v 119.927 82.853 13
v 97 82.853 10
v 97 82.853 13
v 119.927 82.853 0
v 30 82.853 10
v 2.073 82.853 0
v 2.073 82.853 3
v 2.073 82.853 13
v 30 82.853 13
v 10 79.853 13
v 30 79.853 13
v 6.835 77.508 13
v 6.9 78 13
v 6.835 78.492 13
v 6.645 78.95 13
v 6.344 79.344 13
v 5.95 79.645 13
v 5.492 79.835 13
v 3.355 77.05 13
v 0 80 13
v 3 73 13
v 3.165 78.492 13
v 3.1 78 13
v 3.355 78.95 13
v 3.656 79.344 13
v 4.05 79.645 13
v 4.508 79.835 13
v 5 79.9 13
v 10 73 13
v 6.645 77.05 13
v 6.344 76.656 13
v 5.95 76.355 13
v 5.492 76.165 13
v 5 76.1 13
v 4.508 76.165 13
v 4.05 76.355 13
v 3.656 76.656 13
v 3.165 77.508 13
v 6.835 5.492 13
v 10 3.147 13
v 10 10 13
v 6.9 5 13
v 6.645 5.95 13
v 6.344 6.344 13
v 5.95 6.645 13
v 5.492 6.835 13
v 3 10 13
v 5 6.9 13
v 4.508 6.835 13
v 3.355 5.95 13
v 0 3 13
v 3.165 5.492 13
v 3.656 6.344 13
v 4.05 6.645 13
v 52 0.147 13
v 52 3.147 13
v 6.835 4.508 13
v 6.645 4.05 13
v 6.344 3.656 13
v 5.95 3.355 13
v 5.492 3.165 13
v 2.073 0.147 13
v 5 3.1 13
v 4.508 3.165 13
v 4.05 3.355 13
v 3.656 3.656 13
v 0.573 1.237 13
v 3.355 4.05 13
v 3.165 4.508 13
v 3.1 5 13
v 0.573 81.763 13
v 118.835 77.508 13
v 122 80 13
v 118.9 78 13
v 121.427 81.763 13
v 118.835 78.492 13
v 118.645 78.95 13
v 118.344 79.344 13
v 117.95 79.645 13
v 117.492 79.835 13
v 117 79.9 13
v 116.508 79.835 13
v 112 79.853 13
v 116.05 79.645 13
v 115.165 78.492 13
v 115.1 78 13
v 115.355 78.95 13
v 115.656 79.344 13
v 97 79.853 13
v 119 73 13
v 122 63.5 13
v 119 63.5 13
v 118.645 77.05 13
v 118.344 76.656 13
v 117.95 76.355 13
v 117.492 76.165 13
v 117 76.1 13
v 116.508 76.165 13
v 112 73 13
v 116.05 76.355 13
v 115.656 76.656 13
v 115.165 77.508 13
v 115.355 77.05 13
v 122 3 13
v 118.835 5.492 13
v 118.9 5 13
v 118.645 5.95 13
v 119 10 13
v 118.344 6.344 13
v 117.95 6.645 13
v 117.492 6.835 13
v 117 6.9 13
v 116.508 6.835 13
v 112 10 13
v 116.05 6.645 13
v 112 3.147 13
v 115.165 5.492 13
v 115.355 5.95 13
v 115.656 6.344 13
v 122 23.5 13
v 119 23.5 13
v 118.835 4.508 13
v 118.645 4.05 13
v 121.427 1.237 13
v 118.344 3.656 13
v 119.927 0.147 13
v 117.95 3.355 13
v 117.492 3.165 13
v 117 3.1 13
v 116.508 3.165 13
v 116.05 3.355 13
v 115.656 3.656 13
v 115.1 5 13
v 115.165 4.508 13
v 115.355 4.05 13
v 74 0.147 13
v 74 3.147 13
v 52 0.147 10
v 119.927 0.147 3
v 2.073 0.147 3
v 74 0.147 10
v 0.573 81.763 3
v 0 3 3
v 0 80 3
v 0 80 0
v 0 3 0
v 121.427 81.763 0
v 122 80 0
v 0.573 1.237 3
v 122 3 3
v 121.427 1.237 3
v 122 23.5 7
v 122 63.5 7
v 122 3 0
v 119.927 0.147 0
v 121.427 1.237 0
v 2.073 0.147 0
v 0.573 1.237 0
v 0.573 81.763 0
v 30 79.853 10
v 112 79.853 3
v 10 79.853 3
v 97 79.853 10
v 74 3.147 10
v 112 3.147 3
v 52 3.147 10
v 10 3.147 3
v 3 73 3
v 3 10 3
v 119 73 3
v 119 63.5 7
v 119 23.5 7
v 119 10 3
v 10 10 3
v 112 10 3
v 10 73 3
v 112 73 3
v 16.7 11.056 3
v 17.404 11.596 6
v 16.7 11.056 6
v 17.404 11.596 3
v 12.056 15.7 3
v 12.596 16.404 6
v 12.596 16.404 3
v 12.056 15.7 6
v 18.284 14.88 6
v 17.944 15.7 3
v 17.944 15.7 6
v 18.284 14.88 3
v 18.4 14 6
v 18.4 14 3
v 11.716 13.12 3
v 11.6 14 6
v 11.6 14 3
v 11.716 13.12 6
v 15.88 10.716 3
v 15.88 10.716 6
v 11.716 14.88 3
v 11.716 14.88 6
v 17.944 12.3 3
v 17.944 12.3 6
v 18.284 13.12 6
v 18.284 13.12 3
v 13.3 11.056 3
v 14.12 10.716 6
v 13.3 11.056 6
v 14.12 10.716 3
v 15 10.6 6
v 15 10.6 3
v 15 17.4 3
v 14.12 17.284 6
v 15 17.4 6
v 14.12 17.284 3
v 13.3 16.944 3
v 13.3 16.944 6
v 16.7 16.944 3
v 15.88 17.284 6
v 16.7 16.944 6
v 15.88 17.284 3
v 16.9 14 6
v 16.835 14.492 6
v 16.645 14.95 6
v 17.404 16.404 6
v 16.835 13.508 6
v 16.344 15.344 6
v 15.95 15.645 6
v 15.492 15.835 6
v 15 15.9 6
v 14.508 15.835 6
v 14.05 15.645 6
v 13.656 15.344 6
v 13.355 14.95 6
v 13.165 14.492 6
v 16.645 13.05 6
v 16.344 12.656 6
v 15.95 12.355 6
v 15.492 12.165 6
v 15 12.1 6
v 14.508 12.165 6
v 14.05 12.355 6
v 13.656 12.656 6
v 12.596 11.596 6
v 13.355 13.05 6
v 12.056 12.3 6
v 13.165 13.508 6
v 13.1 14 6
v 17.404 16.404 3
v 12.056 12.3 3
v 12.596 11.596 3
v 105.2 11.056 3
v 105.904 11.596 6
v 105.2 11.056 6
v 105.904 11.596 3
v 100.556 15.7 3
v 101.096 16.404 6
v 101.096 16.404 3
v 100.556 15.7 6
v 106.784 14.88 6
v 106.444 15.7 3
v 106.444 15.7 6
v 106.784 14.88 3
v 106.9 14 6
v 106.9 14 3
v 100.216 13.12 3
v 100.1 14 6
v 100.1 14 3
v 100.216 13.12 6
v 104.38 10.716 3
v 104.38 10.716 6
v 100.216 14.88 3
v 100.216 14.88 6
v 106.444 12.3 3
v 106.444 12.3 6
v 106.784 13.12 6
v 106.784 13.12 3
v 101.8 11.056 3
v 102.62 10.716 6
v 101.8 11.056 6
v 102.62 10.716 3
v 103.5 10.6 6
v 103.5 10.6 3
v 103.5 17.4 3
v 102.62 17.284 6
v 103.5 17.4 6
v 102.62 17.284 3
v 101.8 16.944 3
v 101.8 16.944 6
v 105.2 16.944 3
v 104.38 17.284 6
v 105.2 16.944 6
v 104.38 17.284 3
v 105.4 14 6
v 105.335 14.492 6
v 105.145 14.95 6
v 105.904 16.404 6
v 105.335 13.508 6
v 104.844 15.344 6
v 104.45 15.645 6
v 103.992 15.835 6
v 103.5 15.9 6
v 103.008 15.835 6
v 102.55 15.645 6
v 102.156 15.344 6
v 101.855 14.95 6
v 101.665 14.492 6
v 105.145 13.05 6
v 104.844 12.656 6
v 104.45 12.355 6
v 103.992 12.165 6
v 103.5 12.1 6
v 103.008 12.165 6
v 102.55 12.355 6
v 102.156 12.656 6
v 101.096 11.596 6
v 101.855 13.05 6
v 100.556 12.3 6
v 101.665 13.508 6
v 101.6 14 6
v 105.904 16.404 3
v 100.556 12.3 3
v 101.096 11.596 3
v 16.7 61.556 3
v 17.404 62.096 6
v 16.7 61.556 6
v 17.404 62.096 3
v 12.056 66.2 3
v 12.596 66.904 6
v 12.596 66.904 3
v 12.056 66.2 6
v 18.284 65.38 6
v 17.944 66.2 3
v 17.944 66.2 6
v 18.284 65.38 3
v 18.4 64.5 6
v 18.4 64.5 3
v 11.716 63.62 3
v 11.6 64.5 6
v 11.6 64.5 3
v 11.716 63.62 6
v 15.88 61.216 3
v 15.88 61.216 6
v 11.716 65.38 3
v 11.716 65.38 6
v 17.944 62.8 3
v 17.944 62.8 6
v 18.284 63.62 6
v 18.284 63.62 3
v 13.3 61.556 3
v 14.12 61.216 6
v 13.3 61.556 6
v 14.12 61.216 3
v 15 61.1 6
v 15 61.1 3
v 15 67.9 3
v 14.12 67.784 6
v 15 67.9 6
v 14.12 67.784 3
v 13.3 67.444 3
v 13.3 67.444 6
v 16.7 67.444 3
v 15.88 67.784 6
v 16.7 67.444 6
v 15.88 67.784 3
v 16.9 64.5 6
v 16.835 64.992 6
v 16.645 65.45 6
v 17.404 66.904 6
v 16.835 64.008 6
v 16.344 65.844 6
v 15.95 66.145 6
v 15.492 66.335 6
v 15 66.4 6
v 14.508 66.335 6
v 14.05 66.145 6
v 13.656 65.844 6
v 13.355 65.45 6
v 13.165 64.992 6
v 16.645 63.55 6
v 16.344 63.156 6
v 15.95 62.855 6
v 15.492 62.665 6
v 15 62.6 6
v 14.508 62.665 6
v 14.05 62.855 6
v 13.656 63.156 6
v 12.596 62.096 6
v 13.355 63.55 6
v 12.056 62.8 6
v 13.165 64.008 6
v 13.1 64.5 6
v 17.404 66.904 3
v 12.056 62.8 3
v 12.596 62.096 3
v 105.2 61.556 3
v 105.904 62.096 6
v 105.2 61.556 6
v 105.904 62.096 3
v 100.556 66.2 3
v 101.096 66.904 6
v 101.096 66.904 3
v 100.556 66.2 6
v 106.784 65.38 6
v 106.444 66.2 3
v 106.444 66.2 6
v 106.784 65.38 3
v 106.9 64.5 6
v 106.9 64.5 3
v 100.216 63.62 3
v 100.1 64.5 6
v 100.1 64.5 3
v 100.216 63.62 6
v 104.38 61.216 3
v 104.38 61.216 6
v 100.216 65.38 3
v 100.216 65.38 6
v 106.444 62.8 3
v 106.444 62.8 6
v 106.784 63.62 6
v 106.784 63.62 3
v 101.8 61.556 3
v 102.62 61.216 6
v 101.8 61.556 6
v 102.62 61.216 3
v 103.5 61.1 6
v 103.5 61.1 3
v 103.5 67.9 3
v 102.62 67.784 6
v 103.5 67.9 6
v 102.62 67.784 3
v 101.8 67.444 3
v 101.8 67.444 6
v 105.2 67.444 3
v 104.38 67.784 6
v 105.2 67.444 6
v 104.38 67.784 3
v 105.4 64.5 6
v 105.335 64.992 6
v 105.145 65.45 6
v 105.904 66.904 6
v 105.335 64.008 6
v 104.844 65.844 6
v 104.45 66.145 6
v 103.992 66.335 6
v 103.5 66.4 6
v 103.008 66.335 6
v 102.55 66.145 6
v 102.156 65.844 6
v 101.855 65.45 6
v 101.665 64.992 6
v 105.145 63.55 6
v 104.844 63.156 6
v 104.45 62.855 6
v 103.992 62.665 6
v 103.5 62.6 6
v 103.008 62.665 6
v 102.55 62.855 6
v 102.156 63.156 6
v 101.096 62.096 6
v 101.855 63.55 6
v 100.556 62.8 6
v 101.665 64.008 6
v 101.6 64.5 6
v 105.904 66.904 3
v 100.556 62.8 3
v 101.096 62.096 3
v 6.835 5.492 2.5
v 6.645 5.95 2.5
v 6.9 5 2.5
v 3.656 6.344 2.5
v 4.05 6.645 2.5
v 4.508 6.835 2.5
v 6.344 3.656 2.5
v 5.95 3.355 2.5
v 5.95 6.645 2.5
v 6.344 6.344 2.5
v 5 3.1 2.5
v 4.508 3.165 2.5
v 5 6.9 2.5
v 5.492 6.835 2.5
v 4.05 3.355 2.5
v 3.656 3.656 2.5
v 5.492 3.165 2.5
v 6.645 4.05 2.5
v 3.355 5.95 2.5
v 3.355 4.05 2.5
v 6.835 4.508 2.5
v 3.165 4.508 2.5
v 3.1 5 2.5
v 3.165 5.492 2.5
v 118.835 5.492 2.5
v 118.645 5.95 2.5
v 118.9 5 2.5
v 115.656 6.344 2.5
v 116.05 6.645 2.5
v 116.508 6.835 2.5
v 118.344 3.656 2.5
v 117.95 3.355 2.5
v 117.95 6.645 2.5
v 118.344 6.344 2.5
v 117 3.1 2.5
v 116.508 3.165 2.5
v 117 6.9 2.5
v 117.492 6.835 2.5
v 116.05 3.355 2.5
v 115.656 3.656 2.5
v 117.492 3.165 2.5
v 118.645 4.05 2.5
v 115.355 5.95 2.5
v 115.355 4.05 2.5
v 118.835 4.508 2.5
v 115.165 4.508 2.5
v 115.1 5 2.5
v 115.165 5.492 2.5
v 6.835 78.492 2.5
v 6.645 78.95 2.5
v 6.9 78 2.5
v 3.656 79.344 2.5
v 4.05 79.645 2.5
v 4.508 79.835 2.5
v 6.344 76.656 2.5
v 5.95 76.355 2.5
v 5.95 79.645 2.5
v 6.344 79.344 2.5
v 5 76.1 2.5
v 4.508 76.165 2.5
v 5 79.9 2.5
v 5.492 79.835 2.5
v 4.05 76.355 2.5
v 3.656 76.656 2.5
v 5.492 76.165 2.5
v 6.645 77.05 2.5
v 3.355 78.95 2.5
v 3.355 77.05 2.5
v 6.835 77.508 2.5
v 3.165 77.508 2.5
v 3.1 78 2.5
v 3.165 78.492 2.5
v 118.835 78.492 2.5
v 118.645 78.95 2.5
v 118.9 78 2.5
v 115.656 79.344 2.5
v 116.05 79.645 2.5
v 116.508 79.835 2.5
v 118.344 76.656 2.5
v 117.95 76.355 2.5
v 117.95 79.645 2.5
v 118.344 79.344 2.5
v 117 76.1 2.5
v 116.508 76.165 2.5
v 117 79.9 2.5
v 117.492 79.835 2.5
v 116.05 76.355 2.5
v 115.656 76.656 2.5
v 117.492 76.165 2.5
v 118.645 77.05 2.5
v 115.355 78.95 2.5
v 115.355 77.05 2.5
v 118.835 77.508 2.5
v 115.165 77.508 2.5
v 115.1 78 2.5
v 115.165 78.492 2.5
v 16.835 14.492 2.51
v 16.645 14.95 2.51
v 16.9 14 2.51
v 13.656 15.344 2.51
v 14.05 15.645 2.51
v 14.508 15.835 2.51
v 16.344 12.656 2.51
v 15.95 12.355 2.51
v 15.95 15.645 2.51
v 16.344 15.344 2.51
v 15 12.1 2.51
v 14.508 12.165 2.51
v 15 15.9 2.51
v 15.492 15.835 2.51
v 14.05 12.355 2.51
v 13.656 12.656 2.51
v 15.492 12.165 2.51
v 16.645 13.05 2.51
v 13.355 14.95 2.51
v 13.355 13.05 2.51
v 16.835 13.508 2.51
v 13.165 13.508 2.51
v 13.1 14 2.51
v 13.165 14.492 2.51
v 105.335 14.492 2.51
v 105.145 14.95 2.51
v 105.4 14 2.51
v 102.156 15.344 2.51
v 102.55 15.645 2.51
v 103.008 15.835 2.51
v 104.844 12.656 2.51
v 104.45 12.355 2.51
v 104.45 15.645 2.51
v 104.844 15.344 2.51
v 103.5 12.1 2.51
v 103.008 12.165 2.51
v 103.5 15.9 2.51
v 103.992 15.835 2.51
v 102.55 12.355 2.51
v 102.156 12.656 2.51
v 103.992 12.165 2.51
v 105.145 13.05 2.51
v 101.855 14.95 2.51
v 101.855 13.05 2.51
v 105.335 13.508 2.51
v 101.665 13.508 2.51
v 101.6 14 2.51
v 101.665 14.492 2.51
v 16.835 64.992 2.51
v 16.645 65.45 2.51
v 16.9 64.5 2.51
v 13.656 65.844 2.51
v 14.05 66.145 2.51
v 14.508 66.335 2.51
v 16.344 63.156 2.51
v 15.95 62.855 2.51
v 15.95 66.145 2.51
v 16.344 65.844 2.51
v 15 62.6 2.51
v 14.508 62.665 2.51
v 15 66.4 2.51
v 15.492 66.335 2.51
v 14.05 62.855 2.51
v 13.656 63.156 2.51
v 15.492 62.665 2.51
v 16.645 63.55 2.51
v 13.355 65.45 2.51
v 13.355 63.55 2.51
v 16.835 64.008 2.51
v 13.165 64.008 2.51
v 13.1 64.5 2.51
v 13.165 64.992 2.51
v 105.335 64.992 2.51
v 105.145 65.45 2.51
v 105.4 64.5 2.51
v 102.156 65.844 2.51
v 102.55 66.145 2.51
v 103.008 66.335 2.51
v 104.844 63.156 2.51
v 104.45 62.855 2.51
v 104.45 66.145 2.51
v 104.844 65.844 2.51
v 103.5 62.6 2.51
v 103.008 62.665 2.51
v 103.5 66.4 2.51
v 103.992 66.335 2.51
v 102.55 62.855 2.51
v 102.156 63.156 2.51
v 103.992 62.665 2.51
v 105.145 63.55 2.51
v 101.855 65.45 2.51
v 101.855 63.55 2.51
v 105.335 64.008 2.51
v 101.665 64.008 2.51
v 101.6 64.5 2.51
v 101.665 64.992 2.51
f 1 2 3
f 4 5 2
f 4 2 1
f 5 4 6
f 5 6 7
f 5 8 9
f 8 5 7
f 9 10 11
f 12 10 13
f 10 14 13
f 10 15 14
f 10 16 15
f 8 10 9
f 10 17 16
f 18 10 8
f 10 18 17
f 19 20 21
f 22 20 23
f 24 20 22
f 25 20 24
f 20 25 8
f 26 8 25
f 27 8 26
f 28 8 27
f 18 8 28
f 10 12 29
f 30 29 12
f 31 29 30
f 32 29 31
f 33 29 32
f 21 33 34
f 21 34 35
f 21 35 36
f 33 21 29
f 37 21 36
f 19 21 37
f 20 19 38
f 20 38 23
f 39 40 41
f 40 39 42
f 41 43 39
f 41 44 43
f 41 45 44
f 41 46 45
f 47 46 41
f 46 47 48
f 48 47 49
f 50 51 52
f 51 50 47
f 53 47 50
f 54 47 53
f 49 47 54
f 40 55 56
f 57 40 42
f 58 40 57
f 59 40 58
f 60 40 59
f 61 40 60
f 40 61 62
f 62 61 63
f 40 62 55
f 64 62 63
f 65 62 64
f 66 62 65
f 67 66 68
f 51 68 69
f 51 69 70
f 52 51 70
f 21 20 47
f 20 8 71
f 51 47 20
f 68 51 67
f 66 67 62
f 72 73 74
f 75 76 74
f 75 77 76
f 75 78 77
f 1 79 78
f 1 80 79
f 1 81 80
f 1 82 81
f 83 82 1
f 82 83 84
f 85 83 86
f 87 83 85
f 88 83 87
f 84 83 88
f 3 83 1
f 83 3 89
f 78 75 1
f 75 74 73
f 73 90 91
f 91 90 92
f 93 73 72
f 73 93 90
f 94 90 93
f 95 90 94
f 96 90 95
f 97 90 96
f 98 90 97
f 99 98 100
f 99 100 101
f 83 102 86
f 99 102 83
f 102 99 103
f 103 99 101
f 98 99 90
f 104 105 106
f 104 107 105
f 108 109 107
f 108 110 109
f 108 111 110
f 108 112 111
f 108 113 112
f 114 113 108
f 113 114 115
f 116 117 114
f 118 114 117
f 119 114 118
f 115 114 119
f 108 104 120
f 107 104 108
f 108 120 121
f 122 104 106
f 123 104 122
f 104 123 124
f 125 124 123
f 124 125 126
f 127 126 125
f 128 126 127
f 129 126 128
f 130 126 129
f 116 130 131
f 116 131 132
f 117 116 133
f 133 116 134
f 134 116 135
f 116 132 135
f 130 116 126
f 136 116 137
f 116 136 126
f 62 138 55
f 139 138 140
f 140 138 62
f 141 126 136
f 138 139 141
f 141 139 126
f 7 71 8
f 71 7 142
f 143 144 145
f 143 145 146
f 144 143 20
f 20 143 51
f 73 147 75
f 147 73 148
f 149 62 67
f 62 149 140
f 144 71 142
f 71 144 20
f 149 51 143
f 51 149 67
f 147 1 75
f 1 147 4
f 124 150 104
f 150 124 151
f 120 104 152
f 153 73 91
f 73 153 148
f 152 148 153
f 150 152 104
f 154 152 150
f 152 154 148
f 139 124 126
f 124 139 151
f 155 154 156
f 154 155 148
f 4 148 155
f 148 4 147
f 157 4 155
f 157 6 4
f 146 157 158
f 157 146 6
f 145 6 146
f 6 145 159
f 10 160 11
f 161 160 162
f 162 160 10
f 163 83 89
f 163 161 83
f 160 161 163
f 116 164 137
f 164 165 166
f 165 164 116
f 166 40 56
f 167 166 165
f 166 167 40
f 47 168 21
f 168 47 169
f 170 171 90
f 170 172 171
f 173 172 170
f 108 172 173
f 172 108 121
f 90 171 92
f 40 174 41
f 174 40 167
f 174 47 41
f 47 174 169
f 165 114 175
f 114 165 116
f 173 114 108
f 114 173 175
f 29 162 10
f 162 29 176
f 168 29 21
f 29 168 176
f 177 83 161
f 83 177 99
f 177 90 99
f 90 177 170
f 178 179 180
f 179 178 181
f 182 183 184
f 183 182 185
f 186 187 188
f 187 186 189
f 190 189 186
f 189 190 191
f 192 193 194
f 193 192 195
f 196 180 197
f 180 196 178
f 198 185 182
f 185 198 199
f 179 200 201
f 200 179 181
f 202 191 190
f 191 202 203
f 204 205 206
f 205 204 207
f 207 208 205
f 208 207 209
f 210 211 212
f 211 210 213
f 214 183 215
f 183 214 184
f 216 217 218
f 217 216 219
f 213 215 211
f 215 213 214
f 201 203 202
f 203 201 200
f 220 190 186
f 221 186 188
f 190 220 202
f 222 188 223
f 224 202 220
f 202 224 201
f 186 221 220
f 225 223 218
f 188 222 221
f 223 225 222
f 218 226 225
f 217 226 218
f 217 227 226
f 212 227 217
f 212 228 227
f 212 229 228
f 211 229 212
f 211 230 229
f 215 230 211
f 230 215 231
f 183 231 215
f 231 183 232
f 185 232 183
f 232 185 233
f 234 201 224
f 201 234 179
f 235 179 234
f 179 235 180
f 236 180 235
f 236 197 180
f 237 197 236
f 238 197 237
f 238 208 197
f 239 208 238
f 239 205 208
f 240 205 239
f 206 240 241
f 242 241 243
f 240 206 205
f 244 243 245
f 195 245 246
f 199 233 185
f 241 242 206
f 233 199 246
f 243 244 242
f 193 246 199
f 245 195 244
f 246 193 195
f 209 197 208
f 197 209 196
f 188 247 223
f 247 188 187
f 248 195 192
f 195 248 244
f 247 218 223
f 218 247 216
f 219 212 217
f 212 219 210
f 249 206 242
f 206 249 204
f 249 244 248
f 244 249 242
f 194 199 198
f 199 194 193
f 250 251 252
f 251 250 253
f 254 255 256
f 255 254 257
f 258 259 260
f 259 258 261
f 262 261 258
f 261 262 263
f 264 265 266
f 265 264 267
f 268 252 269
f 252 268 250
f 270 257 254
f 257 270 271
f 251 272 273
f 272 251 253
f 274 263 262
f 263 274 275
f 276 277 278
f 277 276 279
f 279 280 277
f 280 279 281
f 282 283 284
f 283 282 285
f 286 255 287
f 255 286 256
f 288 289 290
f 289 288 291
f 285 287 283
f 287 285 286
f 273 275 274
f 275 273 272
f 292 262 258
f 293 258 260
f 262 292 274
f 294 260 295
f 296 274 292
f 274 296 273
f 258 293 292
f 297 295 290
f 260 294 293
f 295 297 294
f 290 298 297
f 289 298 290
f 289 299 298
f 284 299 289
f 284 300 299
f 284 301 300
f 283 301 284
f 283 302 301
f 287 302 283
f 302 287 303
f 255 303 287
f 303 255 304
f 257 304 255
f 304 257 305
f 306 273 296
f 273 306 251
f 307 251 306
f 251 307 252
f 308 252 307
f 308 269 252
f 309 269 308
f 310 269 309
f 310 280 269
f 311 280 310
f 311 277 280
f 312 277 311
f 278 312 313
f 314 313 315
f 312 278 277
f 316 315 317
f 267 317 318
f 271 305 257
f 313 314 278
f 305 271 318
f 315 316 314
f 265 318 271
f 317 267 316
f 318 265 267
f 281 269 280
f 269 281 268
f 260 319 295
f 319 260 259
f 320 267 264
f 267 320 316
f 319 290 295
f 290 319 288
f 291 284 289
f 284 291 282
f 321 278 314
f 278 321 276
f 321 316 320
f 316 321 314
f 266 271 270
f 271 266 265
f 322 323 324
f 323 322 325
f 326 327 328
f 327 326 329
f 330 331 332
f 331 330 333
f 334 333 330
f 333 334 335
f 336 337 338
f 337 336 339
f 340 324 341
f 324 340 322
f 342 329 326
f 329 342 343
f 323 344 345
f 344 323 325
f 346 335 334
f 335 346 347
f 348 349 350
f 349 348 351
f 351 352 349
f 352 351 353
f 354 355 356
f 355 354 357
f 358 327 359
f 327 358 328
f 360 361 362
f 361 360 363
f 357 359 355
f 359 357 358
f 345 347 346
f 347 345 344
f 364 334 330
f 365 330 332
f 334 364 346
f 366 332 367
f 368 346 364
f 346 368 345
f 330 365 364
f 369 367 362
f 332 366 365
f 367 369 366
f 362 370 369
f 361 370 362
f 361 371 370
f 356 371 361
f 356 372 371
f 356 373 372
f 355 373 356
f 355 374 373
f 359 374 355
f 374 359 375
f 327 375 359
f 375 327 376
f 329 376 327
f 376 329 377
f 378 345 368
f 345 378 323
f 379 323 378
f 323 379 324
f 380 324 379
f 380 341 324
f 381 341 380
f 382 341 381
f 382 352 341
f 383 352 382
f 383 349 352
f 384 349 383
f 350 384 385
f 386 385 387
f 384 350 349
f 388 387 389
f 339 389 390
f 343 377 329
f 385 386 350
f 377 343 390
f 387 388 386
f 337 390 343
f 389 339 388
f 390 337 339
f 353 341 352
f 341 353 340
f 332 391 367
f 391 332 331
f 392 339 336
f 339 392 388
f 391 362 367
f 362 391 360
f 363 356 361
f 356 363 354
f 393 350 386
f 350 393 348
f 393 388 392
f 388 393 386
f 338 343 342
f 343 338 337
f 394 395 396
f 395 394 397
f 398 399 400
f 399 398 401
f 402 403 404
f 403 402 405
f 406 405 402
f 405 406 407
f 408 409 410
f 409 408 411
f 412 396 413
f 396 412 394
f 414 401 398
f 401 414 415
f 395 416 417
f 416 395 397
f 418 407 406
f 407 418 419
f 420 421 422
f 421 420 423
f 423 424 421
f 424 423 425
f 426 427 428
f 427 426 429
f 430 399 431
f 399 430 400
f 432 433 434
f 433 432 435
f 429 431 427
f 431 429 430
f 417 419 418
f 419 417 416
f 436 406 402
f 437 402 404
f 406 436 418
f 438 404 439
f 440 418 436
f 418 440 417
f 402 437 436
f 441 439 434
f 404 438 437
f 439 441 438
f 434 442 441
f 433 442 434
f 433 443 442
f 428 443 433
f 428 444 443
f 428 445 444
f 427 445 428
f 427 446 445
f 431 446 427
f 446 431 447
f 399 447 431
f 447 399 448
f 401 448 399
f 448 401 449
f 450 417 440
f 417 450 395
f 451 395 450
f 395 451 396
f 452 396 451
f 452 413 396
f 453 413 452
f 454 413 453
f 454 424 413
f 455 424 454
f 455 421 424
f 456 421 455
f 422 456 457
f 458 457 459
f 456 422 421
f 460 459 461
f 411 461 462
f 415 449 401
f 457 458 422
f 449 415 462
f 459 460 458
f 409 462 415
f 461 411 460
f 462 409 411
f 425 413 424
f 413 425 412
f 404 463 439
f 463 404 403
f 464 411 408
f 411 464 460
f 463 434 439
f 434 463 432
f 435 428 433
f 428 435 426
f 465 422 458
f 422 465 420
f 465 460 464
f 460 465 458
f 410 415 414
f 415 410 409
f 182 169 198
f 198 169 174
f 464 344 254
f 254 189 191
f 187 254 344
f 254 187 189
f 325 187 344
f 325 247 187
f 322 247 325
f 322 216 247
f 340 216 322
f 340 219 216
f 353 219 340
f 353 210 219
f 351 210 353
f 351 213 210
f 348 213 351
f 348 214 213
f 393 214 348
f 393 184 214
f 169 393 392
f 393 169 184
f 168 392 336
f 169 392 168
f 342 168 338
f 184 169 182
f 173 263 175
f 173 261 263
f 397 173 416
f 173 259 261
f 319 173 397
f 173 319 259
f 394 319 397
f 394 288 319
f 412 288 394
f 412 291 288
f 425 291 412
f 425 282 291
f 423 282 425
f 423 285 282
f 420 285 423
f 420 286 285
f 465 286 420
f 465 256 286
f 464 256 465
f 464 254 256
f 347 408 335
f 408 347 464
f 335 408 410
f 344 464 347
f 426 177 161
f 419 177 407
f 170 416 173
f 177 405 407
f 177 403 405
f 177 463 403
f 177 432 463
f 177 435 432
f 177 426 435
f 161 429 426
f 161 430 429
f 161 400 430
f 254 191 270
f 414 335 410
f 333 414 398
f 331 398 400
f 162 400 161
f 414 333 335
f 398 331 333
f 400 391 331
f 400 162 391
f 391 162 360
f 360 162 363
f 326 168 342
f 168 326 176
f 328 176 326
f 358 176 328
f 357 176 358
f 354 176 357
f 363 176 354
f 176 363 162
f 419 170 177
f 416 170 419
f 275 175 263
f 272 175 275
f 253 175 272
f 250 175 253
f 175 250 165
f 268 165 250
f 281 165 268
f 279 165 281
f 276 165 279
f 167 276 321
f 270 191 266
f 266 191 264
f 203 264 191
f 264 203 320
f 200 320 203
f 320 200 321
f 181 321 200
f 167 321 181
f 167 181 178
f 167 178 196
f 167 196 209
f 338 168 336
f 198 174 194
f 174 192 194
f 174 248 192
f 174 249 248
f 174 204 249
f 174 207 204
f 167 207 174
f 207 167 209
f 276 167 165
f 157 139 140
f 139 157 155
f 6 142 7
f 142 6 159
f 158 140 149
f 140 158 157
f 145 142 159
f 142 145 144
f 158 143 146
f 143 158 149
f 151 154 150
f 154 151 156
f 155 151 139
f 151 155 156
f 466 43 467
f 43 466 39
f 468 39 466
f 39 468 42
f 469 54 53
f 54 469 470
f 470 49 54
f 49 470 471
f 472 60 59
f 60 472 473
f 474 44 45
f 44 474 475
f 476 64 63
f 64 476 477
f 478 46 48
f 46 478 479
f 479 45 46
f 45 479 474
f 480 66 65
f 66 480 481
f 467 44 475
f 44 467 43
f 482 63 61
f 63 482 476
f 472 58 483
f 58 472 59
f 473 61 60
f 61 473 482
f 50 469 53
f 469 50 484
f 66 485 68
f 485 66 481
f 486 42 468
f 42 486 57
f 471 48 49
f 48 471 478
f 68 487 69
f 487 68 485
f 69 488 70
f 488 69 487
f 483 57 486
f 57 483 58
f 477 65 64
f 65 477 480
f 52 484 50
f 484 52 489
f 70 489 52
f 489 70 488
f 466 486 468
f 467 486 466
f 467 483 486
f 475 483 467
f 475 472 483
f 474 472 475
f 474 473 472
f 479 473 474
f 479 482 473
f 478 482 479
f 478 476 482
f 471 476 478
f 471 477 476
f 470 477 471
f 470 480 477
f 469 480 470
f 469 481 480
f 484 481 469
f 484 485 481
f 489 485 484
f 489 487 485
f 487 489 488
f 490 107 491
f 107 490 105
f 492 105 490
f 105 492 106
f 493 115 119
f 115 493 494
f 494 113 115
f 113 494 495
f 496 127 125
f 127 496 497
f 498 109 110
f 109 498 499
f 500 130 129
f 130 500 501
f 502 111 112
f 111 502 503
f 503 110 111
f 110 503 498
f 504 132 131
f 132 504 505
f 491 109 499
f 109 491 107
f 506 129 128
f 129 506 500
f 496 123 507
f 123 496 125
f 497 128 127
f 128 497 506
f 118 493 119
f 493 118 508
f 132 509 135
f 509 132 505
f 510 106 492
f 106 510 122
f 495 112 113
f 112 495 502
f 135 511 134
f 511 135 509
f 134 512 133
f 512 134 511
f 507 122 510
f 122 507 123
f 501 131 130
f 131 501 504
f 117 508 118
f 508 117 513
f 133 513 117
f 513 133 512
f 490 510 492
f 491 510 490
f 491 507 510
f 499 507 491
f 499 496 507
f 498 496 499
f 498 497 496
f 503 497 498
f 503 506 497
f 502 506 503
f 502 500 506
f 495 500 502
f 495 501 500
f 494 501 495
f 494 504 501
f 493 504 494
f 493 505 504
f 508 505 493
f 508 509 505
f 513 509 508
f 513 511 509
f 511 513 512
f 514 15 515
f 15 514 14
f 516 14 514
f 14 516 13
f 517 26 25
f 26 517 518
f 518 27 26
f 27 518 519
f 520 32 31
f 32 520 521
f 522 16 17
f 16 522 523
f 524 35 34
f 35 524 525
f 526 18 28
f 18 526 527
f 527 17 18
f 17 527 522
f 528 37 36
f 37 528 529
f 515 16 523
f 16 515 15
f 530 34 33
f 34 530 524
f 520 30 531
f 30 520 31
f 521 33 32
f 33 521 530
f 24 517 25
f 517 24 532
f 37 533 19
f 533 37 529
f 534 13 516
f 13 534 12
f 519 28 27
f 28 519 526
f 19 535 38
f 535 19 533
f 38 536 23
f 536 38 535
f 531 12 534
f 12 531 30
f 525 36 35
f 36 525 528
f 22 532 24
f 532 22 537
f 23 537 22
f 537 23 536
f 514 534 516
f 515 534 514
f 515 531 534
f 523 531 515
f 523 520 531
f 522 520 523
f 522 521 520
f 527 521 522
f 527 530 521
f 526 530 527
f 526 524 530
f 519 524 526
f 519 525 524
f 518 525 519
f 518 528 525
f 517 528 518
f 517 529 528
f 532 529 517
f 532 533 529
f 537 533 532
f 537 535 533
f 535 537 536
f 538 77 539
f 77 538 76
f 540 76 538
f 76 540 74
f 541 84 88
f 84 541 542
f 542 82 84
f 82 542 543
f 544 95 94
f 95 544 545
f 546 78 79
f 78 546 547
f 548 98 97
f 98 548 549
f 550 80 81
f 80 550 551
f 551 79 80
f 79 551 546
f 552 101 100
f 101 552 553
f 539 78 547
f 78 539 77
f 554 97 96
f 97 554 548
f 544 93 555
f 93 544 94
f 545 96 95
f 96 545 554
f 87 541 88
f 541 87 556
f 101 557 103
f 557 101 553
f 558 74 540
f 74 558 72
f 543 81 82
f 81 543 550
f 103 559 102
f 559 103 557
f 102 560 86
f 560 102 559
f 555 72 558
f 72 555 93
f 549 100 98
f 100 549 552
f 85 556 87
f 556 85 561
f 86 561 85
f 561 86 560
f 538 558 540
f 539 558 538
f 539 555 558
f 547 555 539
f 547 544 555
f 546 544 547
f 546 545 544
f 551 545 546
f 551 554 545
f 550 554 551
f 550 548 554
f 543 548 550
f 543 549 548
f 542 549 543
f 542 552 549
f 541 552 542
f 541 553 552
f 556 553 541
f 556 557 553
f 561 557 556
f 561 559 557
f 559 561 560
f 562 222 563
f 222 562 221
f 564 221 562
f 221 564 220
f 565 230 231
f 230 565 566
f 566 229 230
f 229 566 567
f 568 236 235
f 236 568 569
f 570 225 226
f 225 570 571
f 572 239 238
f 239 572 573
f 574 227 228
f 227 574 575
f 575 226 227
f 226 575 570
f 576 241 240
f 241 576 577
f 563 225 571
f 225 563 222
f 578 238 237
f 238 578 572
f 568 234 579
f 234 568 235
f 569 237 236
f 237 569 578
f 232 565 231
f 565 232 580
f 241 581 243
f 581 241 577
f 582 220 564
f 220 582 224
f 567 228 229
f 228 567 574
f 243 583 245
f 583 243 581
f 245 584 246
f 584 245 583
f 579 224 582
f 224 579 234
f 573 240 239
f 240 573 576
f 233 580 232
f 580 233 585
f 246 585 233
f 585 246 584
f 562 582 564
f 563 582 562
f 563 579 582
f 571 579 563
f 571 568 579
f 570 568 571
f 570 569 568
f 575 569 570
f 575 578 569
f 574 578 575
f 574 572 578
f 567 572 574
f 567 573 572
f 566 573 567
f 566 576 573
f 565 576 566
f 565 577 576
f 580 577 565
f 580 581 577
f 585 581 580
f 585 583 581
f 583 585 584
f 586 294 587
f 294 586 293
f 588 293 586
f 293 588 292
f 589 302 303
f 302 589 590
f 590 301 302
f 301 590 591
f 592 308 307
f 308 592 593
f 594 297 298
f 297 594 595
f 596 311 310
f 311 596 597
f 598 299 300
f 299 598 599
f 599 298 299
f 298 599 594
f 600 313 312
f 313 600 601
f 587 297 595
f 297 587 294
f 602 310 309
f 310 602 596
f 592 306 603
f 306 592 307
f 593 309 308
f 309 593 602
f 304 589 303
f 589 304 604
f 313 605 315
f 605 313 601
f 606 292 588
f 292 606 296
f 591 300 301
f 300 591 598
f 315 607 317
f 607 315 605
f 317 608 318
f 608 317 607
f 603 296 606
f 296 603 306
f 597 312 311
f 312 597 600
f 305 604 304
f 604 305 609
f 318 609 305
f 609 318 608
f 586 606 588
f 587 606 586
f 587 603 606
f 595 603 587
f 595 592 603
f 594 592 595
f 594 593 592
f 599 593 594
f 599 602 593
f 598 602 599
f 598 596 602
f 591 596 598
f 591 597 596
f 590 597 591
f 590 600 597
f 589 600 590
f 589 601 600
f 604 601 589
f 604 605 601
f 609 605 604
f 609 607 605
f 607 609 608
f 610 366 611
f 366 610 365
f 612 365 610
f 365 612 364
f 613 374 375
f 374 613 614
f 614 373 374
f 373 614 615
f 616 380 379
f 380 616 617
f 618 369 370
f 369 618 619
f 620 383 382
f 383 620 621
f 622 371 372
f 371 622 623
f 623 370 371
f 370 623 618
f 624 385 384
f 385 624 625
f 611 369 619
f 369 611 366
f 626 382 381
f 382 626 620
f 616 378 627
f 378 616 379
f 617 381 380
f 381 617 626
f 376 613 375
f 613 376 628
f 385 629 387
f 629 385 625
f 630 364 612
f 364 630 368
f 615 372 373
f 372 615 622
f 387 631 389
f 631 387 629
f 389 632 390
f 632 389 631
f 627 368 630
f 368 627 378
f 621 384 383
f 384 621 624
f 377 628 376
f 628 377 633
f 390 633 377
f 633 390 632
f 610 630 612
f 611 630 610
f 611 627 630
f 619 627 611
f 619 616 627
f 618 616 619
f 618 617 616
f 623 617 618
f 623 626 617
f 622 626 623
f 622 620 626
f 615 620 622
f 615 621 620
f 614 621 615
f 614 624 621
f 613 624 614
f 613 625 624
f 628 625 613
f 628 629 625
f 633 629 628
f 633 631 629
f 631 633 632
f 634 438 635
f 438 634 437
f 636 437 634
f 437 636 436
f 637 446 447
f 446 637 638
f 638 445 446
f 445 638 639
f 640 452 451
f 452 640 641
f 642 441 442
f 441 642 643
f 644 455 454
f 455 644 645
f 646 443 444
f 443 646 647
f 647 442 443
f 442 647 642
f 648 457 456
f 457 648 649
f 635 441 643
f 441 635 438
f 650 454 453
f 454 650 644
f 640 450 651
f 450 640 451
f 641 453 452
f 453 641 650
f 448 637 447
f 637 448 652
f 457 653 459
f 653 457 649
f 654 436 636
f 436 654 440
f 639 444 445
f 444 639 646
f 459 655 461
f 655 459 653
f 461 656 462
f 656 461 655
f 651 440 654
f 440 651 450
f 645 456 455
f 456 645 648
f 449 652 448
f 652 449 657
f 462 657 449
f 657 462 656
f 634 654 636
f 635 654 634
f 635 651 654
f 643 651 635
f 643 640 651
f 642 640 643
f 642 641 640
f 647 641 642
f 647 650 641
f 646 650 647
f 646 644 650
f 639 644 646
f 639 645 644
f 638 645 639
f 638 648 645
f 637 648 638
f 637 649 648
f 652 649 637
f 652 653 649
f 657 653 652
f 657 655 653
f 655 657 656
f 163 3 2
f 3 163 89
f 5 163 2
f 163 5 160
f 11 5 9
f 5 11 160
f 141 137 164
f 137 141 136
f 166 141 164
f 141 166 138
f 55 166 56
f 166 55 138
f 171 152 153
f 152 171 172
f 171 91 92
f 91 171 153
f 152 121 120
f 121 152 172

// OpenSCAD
// file: pillar-all1.scad
// Box for microusb power breakout.

// Copyright (C) 2016 Embecosm Limited (www.embecosm.com)

// Contributor: Jeremy Bennett <jeremy.bennett@embecosm.com>

// This file is licensed under the Creative Commons Attribution-ShareAlike 3.0
// Unported License. To view a copy of this license, visit
// http://creativecommons.org/licenses/by-sa/3.0/ or send a letter to Creative
// Commons, PO Box 1866, Mountain View, CA 94042, USA.


// A container for a circuit board containing microusb power breakout. This is
// commond code and definitions.

DELTA = 0.01;
PILLAR = 10;
WALL = 3;
PCB_X = 102 + (PILLAR - WALL) * 2;
PCB_Y = 77;
H = 20;      // overall box height
BASE_H = 10; // base height
TOP_H = H - BASE_H - WALL * 2;
USB_W = 11;  // usb power width
USB_H = 3;   // usb power height
WIRE_W = 40; // wire hole length
WIRE_H = 6;  // wire hole height
M3_R = 1.9;
M3_HEAD_R = 3.4;
M3_HEAD_H = 3;
M3_NUT_H = 2.5;

module round_cube (x, y, z) {
    hull () {
        translate (v = [-x/2 + 3, -y/2 + 3, 0])
            cylinder (r = 3, h = z, center = true);
        translate (v = [ x/2 - 3, -y/2 + 3, 0])
            cylinder (r = 3, h = z, center = true);
        translate (v = [-x/2 + 3,  y/2 - 3, 0])
            cylinder (r = 3, h = z, center = true);
        translate (v = [ x/2 - 3,  y/2 - 3, 0])
            cylinder (r = 3, h = z, center = true);
        }
}
// main file
// Box for microusb power breakout.

// Copyright (C) 2016 Embecosm Limited (www.embecosm.com)

// Contributor: Jeremy Bennett <jeremy.bennett@embecosm.com>

// This file is licensed under the Creative Commons Attribution-ShareAlike 3.0
// Unported License. To view a copy of this license, visit
// http://creativecommons.org/licenses/by-sa/3.0/ or send a letter to Creative
// Commons, PO Box 1866, Mountain View, CA 94042, USA.


// A container for a circuit board containing microusb power breakout. This is
// the base.

include <pillar-all1.scad>

module sides () {
    translate (v = [PCB_X / 2 + WALL, PCB_Y / 2 + WALL, (BASE_H + WALL) / 2])
        difference () {
            round_cube (PCB_X + WALL * 2, PCB_Y + WALL * 2, BASE_H + WALL);
            round_cube (PCB_X, PCB_Y, BASE_H + WALL + DELTA);
        }
}

module base () {
    translate (v = [PCB_X / 2 + WALL, PCB_Y / 2 + WALL, WALL / 2])
        round_cube (PCB_X + WALL * 2, PCB_Y + WALL * 2, WALL);
}


module pillars () {

     // Corners

     translate (v = [WALL, WALL, WALL - DELTA])
	  cube (size = [PILLAR - WALL, PILLAR - WALL, BASE_H + DELTA],
		center = false);
     translate (v = [WALL * 2 + PCB_X - PILLAR, WALL, WALL - DELTA])
	  cube (size = [PILLAR - WALL, PILLAR - WALL, BASE_H + DELTA],
		center = false);
     translate (v = [WALL, WALL * 2 + PCB_Y - PILLAR, WALL - DELTA])
	  cube (size = [PILLAR - WALL, PILLAR - WALL, BASE_H + DELTA],
		center = false);
     translate (v = [WALL * 2 + PCB_X - PILLAR,
		     WALL * 2 + PCB_Y - PILLAR, WALL - DELTA])
	  cube (size = [PILLAR - WALL, PILLAR - WALL, BASE_H + DELTA],
		center = false);

     // Supports

     translate (v = [15, 14, 0])
	  cylinder (r = M3_HEAD_R, h = WALL + 3, $fn=24, center = false);
     translate (v = [15 + 88.5, 14, 0])
	  cylinder (r = M3_HEAD_R, h = WALL + 3, $fn=24, center = false);
     translate (v = [15, 14 + 50.5, 0])
	  cylinder (r = M3_HEAD_R, h = WALL + 3, $fn=24, center = false);
     translate (v = [15 + 88.5, 14 + 50.5, 0])
	  cylinder (r = M3_HEAD_R, h = WALL + 3, $fn=24, center = false);
}

module hole () {
    difference () {
        cylinder (h = WALL + BASE_H + DELTA * 2, r = M3_R, $fn = 24,
                  center = false);
        cylinder (h = M3_NUT_H + DELTA, r = M3_HEAD_R, $fn = 6,
                  center = false);
    }
}

module holes () {
    union () {

	 // Corners

	 translate (v = [PILLAR / 2, PILLAR / 2, -DELTA])
	      hole ();
	 translate (v = [WALL * 2 + PCB_X - PILLAR / 2, PILLAR / 2, -DELTA])
	      hole ();
	 translate (v = [PILLAR / 2, WALL * 2 + PCB_Y - PILLAR / 2, -DELTA])
	      hole ();
	 translate (v = [WALL * 2 + PCB_X - PILLAR / 2,
			 WALL * 2+ PCB_Y - PILLAR / 2, -DELTA])
	      hole ();

	 // Supports

     translate (v = [15, 14, 0])
	  hole ();
     translate (v = [15 + 88.5, 14, 0])
	  hole ();
     translate (v = [15, 14 + 50.5, 0])
	  hole ();
     translate (v = [15 + 88.5, 14 + 50.5, 0])
	  hole ();
    }
}

module wire_holes () {

     // Slot for power supplies

     translate (v = [30, PCB_Y + WALL/2, WALL + BASE_H - USB_H])
	  cube (size = [67, WIRE_W, WIRE_H + DELTA], center = false);

     // Slot for input signal wires from Pi

     translate (v = [52, 0, WALL + BASE_H - USB_H])
	  cube (size = [22, WIRE_W, WIRE_H + DELTA], center = false);

     // Slot for output wires to cuttlefishes/seahorses

     translate ([PCB_X + WALL - 1, PCB_Y / 2 - 15, WALL + BASE_H - WIRE_H])
	  cube (size = [WALL * 2, WIRE_W, WIRE_H + DELTA], center = false);
}


module power_box_base () {
     union () {
	  sides ();
	  base ();
	  pillars ();
     }
}

module power_box () {
     difference () {
	  power_box_base ();
	  holes ();
	  wire_holes ();
     }
}

power_box ();
